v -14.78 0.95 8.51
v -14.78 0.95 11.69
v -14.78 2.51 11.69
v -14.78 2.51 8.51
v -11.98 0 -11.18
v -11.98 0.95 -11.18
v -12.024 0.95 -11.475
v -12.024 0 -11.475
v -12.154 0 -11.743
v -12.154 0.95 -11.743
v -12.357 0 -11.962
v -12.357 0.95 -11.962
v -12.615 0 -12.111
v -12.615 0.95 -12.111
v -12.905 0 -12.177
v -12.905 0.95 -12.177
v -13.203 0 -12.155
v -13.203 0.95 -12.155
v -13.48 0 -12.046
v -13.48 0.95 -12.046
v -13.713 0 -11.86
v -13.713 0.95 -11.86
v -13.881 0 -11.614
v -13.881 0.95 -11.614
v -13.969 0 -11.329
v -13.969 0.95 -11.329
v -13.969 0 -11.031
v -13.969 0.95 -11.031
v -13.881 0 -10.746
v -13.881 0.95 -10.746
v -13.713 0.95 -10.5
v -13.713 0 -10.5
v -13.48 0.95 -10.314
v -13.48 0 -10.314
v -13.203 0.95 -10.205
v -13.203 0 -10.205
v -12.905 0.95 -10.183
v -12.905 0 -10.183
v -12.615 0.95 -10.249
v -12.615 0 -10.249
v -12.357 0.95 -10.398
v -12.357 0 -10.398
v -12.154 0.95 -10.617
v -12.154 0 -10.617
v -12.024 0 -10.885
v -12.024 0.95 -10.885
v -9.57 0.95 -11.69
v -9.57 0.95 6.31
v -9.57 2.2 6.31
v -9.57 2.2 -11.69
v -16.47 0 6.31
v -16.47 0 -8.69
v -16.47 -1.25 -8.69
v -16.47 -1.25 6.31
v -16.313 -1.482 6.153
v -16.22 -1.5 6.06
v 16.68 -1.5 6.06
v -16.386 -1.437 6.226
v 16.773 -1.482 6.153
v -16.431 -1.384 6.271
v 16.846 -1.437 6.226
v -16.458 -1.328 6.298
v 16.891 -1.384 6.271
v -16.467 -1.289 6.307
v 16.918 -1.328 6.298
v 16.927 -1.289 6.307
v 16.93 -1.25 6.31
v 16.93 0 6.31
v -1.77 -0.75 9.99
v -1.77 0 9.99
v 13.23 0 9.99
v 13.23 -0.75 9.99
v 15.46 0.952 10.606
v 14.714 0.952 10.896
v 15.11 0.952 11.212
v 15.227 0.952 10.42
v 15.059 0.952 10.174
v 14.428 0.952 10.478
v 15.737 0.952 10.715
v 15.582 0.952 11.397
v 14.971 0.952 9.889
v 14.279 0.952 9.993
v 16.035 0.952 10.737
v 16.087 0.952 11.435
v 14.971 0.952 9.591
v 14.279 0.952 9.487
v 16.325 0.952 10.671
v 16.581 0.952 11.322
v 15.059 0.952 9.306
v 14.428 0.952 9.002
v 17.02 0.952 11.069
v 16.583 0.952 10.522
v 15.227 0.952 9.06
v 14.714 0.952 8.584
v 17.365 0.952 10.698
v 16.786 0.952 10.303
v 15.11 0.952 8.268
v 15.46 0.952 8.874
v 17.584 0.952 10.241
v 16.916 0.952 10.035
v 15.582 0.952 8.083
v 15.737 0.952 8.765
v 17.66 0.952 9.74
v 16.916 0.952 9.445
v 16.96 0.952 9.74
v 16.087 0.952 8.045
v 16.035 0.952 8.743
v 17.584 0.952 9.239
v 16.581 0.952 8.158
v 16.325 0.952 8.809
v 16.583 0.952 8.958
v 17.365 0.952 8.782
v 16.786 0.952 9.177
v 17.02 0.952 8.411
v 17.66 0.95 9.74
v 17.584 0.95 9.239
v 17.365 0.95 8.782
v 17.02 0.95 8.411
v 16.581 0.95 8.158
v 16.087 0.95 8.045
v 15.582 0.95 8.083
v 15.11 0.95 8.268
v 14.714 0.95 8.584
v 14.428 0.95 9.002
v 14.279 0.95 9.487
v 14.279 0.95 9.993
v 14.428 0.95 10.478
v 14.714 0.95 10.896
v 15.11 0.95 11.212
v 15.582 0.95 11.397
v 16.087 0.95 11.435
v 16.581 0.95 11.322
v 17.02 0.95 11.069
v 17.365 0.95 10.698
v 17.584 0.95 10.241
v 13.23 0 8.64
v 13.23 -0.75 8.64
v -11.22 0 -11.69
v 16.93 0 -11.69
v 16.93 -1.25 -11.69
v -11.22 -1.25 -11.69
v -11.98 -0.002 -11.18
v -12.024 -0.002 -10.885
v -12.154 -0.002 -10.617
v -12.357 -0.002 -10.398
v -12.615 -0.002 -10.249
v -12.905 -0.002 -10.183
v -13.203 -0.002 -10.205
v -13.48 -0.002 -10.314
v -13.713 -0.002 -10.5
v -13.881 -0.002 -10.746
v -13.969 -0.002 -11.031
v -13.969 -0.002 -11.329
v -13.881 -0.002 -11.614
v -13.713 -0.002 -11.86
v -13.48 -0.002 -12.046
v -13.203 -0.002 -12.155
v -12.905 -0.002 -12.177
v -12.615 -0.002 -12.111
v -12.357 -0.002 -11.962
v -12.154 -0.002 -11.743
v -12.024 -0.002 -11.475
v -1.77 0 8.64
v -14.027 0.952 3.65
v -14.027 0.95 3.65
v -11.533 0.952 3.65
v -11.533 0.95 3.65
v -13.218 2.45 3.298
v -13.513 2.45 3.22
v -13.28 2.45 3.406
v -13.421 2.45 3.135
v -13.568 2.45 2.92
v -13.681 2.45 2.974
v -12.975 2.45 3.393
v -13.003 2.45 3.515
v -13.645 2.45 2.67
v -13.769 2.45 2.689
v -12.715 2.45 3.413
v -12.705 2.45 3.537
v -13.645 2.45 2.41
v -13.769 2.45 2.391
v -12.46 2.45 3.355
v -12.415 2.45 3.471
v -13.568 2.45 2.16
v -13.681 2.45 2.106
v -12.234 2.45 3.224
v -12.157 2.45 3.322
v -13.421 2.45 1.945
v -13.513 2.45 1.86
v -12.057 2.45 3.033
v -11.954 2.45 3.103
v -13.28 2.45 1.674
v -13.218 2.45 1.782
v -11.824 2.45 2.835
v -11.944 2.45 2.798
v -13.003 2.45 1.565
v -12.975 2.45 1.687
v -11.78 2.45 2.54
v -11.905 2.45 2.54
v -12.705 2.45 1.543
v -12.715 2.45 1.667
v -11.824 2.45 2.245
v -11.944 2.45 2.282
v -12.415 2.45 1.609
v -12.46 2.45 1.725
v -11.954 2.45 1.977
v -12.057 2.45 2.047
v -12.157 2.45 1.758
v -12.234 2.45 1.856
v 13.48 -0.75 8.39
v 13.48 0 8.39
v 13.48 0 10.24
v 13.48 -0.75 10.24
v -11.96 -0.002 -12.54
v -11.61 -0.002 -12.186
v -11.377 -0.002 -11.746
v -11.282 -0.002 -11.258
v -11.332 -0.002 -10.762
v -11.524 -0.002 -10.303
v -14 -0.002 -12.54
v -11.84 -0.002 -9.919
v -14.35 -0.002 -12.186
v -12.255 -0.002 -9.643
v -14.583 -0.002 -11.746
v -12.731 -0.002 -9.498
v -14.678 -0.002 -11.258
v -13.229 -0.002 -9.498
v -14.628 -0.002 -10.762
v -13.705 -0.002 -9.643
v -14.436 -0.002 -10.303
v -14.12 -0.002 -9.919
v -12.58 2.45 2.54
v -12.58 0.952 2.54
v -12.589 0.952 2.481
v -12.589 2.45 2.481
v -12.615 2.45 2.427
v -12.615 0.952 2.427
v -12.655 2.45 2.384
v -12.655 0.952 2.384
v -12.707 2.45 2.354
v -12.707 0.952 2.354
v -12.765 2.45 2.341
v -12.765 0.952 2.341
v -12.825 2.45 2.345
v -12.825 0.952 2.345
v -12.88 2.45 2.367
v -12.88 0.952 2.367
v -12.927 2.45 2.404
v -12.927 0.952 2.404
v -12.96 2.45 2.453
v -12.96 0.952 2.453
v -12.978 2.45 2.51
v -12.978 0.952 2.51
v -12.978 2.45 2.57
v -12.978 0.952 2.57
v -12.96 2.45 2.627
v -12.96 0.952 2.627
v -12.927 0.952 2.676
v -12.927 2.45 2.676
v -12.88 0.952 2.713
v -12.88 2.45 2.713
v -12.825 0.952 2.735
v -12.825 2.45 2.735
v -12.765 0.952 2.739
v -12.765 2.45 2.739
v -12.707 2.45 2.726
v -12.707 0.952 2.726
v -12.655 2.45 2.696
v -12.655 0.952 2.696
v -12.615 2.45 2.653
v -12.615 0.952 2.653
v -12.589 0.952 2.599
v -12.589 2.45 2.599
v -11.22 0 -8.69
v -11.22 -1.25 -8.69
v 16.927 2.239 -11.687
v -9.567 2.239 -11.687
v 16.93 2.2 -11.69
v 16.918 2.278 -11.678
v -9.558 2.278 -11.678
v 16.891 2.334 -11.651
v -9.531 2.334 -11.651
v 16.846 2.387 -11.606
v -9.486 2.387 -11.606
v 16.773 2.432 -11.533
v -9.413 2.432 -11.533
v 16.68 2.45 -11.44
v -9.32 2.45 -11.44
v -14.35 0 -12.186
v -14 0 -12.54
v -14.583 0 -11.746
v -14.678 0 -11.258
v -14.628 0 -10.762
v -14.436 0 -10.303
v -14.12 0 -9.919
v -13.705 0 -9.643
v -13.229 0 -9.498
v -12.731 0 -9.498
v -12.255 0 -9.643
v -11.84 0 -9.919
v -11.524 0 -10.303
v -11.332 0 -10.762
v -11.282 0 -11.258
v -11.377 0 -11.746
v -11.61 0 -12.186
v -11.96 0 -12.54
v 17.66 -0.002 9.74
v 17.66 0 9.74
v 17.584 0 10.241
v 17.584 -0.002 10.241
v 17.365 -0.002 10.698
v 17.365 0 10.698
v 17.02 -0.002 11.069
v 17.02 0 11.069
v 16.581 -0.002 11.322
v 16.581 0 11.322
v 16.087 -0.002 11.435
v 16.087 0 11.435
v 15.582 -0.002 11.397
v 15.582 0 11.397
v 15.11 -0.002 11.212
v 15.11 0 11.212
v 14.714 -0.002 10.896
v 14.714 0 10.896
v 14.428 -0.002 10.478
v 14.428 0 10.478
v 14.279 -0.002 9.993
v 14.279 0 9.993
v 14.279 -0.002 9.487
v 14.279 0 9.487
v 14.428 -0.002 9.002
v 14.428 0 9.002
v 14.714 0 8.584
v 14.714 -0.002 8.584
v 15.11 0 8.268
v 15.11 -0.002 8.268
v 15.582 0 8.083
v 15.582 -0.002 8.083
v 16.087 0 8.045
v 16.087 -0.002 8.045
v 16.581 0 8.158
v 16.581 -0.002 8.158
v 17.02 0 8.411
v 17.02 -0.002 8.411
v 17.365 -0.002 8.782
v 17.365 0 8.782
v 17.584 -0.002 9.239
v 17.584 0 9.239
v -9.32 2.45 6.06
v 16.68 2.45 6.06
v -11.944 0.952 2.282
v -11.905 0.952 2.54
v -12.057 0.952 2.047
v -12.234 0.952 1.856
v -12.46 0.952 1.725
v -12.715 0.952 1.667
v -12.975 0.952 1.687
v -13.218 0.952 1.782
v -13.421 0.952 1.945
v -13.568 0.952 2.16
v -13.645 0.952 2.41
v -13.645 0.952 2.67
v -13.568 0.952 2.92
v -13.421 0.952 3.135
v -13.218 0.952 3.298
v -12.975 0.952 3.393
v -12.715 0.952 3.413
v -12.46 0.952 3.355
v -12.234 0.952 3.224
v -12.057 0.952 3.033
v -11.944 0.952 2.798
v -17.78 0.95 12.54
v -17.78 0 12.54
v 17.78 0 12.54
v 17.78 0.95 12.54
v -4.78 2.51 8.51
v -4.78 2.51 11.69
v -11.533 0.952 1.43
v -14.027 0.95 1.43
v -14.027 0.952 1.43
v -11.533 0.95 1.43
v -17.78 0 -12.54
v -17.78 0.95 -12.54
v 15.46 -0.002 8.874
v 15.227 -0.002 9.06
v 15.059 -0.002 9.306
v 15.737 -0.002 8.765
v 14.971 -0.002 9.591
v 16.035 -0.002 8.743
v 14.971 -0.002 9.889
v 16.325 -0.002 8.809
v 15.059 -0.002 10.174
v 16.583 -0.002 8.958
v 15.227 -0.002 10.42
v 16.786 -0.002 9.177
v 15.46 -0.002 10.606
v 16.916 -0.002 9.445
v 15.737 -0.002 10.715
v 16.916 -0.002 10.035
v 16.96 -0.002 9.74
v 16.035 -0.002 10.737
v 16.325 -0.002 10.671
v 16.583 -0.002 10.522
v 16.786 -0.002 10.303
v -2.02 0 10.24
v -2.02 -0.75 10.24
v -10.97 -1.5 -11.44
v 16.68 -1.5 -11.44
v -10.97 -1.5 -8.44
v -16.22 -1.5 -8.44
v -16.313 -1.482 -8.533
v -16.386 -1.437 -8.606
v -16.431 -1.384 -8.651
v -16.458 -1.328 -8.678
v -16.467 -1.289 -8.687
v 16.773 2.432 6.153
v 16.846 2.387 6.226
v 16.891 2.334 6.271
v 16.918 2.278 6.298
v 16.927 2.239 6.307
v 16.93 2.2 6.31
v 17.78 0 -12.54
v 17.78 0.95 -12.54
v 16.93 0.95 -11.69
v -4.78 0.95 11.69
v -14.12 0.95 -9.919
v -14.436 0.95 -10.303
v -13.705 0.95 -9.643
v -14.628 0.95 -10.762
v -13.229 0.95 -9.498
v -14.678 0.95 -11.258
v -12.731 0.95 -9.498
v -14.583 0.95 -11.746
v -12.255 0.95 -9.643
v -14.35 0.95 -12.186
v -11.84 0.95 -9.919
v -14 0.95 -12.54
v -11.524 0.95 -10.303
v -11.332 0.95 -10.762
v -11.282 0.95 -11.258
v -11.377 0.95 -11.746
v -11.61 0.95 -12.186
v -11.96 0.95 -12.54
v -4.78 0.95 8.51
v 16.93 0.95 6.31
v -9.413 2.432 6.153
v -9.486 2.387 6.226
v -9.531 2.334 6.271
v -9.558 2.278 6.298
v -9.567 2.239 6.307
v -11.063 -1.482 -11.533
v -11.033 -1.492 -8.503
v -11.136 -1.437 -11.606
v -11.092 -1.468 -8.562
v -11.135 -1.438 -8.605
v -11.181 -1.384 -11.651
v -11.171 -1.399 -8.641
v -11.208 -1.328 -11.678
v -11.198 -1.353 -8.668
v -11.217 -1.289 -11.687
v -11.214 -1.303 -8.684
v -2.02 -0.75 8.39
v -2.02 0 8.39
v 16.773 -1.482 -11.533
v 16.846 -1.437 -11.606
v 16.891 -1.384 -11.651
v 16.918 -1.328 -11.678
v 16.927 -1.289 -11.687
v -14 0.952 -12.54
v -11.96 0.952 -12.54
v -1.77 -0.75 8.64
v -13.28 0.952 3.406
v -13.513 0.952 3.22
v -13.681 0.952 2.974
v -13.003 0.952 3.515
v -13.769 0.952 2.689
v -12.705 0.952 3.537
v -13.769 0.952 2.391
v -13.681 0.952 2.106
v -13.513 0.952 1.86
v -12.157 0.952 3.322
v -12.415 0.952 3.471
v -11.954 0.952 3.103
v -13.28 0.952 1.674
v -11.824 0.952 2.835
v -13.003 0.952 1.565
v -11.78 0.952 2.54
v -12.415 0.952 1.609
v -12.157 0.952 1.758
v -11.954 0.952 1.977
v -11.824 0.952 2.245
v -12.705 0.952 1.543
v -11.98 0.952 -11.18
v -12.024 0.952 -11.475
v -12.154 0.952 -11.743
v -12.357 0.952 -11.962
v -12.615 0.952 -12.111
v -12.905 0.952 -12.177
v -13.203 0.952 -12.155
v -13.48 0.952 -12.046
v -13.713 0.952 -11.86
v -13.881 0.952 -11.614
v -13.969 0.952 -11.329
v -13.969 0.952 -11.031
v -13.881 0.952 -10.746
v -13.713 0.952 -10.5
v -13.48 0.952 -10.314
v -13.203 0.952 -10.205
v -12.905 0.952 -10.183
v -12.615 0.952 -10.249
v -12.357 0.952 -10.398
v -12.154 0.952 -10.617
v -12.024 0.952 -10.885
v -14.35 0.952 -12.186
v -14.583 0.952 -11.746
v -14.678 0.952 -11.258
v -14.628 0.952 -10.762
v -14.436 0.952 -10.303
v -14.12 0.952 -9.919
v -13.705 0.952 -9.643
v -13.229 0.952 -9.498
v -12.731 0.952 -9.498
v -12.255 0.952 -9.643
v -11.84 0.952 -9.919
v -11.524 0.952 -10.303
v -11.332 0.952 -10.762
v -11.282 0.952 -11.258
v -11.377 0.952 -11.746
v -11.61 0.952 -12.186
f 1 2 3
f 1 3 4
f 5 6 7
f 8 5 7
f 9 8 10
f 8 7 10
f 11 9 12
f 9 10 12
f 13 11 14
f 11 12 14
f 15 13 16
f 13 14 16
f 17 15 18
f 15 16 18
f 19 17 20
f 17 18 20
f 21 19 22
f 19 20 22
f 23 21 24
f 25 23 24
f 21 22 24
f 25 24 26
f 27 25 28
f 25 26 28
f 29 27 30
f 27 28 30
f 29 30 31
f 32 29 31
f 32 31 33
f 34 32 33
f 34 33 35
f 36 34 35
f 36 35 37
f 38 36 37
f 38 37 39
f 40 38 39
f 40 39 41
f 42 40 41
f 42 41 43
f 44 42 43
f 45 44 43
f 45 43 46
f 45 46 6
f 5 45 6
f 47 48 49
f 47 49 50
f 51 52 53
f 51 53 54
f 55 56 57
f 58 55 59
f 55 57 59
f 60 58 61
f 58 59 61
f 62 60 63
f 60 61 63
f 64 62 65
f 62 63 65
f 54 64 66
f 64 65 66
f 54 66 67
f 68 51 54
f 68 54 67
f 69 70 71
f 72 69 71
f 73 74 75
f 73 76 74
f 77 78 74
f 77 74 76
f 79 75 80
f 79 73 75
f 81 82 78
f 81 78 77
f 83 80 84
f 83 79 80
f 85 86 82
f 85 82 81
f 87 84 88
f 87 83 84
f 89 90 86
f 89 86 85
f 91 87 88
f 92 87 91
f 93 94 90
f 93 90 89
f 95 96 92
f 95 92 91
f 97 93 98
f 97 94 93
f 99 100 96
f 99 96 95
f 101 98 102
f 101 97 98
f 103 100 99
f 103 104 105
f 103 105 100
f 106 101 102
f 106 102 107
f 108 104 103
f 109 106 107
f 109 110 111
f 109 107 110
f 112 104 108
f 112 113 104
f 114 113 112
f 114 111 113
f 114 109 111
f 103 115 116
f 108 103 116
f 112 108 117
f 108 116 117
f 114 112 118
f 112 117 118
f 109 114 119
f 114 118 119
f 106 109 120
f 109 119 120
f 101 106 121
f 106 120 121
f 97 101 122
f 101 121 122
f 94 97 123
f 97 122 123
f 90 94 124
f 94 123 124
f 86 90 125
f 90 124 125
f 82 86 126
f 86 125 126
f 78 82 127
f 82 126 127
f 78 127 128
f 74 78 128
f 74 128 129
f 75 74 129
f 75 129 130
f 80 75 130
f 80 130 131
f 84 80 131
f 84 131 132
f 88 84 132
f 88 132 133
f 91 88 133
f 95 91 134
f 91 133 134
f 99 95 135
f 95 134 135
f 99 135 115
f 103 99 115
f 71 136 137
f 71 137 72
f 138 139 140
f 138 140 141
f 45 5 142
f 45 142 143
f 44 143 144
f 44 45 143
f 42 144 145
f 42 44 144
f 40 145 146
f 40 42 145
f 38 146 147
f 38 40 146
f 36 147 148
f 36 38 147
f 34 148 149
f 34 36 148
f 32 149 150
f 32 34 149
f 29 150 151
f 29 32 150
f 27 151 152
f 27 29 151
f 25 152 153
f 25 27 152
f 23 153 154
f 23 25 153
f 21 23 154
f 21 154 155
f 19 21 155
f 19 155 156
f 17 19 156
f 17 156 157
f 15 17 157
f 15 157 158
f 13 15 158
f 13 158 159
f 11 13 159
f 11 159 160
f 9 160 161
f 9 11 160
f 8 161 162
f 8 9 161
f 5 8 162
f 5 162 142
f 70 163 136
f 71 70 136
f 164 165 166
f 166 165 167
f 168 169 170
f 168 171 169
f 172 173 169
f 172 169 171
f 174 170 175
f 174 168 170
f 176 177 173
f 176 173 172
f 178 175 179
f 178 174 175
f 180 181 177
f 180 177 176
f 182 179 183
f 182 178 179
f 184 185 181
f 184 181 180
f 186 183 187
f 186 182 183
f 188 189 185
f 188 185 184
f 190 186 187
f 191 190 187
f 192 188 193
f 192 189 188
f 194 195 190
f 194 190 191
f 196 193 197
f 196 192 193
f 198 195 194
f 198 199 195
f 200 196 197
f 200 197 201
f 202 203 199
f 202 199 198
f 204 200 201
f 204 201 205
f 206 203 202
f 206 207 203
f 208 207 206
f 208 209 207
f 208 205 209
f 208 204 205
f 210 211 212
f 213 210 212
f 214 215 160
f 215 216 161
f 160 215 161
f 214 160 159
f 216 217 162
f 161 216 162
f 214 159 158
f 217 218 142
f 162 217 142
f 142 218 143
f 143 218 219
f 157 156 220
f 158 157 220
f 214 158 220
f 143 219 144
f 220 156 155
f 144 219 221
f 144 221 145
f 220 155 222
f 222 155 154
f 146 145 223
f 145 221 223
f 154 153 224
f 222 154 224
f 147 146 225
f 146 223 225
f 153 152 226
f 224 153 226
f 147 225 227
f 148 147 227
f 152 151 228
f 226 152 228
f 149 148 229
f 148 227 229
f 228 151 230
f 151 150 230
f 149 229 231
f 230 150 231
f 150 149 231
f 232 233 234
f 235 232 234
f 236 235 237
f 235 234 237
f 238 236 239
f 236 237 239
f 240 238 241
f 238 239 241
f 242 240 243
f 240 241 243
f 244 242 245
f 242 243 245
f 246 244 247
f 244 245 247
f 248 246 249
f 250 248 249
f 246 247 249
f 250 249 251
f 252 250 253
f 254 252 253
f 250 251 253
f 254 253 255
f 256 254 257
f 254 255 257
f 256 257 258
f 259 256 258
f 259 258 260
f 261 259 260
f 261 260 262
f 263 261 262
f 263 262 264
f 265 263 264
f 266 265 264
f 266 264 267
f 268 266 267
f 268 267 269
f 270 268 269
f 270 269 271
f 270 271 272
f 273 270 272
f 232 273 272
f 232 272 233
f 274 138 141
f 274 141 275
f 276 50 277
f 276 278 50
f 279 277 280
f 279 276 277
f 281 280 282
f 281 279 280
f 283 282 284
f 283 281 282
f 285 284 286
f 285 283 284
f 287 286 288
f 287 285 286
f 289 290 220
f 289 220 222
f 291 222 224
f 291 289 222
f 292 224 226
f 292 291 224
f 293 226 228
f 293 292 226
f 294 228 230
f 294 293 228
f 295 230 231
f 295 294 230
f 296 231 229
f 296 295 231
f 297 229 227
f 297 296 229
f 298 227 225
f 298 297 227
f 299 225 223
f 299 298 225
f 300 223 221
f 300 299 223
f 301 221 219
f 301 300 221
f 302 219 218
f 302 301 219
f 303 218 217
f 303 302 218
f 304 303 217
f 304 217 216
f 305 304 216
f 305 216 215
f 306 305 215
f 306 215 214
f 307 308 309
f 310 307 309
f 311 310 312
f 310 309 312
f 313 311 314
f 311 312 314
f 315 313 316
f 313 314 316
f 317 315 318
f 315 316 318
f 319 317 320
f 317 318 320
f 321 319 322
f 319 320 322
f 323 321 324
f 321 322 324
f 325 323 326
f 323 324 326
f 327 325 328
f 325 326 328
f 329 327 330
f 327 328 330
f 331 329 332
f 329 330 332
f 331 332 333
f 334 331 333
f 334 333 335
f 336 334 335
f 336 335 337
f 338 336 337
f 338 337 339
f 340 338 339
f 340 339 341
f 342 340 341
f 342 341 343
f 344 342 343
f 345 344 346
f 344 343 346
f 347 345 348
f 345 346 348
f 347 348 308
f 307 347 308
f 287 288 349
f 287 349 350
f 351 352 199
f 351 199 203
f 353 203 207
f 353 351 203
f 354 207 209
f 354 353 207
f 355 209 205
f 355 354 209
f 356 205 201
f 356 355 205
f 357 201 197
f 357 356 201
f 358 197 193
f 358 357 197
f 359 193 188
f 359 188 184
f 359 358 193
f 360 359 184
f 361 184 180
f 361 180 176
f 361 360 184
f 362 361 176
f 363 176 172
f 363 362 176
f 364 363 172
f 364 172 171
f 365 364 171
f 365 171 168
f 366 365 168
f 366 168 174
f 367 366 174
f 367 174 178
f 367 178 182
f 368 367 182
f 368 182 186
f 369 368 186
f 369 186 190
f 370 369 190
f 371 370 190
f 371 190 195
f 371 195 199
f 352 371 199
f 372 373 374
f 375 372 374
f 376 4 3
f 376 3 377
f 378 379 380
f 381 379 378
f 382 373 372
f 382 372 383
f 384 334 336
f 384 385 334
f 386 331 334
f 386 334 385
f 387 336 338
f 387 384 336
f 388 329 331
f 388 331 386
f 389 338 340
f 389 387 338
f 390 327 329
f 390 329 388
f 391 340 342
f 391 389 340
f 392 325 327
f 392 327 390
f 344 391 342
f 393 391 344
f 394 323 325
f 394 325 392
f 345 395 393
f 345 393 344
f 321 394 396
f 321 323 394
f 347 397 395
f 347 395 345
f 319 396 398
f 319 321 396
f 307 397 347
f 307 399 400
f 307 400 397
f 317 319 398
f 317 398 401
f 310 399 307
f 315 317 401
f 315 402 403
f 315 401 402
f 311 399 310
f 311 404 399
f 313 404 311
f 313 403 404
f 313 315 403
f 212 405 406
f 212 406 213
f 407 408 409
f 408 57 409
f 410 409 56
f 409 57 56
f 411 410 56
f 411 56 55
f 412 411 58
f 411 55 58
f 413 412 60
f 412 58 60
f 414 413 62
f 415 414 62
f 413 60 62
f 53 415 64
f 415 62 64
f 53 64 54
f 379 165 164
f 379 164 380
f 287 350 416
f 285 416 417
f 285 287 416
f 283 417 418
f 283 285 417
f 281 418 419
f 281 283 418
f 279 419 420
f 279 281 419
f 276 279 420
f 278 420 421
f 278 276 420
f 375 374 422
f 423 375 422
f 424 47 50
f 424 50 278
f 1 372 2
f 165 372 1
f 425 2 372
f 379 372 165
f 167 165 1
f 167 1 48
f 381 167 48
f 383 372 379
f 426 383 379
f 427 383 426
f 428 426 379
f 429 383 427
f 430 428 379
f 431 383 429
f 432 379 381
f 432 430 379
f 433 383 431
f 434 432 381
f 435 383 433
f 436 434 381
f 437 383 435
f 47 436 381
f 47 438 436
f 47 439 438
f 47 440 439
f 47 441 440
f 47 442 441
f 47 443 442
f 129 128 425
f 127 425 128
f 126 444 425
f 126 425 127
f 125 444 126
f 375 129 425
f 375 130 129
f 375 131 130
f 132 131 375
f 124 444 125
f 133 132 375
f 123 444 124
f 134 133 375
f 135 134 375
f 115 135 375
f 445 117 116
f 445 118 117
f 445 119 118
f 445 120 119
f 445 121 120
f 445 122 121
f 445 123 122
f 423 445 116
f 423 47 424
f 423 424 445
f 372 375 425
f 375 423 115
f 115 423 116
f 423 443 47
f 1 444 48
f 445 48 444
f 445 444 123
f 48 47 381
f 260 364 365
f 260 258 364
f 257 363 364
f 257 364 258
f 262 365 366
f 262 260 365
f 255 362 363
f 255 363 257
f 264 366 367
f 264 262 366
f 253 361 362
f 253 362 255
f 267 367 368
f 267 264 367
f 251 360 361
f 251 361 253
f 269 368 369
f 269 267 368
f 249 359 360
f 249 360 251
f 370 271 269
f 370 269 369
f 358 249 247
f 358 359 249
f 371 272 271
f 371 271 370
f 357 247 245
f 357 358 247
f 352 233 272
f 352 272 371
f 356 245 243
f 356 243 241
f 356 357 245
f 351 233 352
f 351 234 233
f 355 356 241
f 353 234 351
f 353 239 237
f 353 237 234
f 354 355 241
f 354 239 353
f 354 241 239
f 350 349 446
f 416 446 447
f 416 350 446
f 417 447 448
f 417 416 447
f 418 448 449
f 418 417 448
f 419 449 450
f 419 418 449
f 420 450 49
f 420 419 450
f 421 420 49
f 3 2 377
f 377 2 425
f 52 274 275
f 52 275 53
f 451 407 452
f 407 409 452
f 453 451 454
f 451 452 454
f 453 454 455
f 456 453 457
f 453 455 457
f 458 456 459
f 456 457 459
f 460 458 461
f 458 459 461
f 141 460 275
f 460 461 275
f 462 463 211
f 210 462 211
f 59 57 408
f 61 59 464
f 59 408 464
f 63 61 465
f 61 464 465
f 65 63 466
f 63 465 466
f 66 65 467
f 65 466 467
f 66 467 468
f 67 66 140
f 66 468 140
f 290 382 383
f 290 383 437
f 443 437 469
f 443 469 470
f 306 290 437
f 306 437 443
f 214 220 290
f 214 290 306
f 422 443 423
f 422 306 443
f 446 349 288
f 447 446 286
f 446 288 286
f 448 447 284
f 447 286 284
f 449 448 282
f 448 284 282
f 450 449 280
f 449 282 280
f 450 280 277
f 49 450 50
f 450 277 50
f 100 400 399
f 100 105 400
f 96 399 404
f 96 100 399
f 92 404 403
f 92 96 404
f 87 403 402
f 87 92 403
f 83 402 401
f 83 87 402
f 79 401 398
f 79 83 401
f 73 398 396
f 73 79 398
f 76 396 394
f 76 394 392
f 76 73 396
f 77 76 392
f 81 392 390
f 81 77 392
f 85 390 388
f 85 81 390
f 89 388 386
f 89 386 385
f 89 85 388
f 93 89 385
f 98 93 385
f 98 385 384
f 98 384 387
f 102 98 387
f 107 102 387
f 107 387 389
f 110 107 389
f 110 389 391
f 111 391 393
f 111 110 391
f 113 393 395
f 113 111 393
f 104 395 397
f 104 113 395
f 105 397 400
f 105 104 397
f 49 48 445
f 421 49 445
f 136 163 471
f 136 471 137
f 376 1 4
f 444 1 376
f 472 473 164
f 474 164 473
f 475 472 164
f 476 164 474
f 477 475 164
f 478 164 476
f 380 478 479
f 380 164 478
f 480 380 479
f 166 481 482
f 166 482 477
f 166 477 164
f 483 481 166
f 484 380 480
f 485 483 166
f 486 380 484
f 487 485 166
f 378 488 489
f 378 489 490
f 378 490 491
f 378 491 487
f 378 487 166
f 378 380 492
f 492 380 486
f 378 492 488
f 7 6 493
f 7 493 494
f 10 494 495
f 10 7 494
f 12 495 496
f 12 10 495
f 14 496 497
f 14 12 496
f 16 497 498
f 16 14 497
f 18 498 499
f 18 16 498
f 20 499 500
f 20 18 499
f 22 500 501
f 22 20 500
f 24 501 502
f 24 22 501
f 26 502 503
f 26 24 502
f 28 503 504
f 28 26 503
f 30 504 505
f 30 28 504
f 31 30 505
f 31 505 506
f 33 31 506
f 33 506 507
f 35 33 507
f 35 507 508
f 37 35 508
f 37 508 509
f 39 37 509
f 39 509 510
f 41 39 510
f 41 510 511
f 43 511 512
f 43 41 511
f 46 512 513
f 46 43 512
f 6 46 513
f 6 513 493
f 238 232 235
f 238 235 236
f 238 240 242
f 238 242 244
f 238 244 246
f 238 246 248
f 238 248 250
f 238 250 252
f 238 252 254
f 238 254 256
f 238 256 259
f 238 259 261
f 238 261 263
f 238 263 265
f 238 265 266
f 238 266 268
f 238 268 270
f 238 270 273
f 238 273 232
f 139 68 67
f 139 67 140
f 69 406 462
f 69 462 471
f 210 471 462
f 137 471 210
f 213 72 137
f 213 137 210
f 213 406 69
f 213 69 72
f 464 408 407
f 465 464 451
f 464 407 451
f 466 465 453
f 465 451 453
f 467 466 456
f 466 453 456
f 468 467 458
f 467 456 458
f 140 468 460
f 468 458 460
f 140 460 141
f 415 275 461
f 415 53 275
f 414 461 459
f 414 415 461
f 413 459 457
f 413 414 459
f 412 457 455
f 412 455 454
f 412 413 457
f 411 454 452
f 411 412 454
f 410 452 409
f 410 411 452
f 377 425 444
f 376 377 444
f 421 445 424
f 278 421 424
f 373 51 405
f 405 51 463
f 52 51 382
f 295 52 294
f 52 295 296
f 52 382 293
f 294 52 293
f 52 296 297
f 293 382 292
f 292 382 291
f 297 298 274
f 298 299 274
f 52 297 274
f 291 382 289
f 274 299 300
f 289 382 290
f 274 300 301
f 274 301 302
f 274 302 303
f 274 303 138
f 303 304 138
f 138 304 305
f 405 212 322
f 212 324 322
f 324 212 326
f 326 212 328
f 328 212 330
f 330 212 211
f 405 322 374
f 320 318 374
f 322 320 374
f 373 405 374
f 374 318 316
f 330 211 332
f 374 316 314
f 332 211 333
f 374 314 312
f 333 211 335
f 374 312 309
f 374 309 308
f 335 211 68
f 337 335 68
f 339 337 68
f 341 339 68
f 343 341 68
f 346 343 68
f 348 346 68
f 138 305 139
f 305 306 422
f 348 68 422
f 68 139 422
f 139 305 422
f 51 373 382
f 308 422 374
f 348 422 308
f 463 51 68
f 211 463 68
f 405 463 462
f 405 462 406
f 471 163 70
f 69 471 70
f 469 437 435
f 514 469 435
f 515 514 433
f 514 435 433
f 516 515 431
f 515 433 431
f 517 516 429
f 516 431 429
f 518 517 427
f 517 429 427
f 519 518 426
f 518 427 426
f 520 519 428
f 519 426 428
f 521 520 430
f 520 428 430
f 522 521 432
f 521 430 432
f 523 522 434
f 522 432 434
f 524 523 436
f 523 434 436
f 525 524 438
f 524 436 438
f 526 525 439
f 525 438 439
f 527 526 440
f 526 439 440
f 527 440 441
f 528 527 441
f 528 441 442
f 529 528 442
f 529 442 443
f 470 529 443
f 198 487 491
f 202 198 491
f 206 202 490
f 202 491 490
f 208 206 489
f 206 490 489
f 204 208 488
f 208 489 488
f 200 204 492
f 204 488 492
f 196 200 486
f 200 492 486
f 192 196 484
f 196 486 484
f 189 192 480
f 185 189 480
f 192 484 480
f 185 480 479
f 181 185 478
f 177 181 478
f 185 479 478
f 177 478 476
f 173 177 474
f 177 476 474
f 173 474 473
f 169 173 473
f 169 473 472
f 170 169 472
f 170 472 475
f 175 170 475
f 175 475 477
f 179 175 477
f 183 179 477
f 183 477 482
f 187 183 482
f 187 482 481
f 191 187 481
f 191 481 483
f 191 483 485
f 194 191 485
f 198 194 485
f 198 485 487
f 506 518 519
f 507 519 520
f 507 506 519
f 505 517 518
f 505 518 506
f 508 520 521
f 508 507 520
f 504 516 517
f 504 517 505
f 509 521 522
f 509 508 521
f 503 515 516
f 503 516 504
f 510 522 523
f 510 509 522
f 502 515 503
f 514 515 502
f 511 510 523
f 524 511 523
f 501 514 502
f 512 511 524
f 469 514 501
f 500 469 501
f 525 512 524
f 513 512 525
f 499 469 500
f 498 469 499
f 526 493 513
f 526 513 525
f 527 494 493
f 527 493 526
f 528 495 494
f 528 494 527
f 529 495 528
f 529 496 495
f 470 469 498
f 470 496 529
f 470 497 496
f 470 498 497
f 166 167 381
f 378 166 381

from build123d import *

# Parameters (mm, degrees)
SKETCH1_W           = 35.56
SKETCH1_H           = 25.08
BOSS_EXTRUDE1_DEPTH = 0.95
SKETCH2_W           = 26.5
SKETCH2_H           = 18
BOSS_EXTRUDE2_DEPTH = 1.5
BOSS_EXTRUDE3_DEPTH = 1.5
SKETCH4_W           = 10
SKETCH4_H           = 3.18
BOSS_EXTRUDE4_DEPTH = 1.56
SKETCH5_R           = 1
SKETCH5_R_2         = 0.875
SKETCH5_R_3         = 0.2
BOSS_EXTRUDE5_DEPTH = 1.5
SKETCH6_W           = 15.5
SKETCH6_H           = 1.85
SKETCH6_W_2         = 15
SKETCH6_H_2         = 1.35
BOSS_EXTRUDE6_DEPTH = 0.75
SKETCH7_R           = 1
CUT_EXTRUDE1_DEPTH  = 3.51
SKETCH8_R           = 1
CUT_EXTRUDE2_DEPTH  = 3.45
SKETCH9_R           = 1.7
SKETCH9_R_2         = 1
BOSS_EXTRUDE7_DEPTH = 0.0025
SKETCH10_R          = 1.7
SKETCH10_R_2        = 1
BOSS_EXTRUDE8_DEPTH = 0.0025
FILLET1_R           = 0.25
SKETCH11_W          = 2.494146152
SKETCH11_H          = 2.219681882
BOSS_EXTRUDE9_DEPTH = 0.0025


with BuildPart() as part:
    # Sketch1 → Boss-Extrude1 (new body)
    with BuildSketch(Plane(origin=(0, 0, 0), x_dir=(1, 0, 0), z_dir=(0, 1, 0))):
        Rectangle(SKETCH1_W, SKETCH1_H)
    extrude(amount=BOSS_EXTRUDE1_DEPTH)

    # Sketch2 → Boss-Extrude2 (add)
    with BuildSketch(Plane(origin=(0, 0.95, 0), x_dir=(1, 0, 0), z_dir=(0, 1, 0))):
        with Locations((3.68, 2.69)):
            Rectangle(SKETCH2_W, SKETCH2_H)
    extrude(amount=BOSS_EXTRUDE2_DEPTH)

    # Sketch3 → Boss-Extrude3 (add)
    with BuildSketch(Plane.XZ):
        Polygon((16.93, 6.31), (16.93, -11.69), (-11.22, -11.69), (-11.22, -8.69), (-16.47, -8.69), (-16.47, 6.31), align=None)
    extrude(amount=BOSS_EXTRUDE3_DEPTH)

    # Sketch4 → Boss-Extrude4 (add)
    with BuildSketch(Plane(origin=(0, 0.95, 0), x_dir=(1, 0, 0), z_dir=(0, 1, 0))):
        with Locations((-9.78, -10.1)):
            Rectangle(SKETCH4_W, SKETCH4_H)
    extrude(amount=BOSS_EXTRUDE4_DEPTH)

    # Sketch5 → Boss-Extrude5 (add)
    with BuildSketch(Plane(origin=(0, 0.95, 0), x_dir=(1, 0, 0), z_dir=(0, 1, 0))):
        with Locations((-12.78, -2.54)):
            Circle(SKETCH5_R)
        with Locations((-12.78, -2.54)):
            Circle(SKETCH5_R_2, mode=Mode.SUBTRACT)
        with Locations((-12.78, -2.54)):
            Circle(SKETCH5_R_3)
    extrude(amount=BOSS_EXTRUDE5_DEPTH)

    # Sketch6 → Boss-Extrude6 (add)
    with BuildSketch(Plane.XZ):
        with Locations((5.73, 9.315)):
            Rectangle(SKETCH6_W, SKETCH6_H)
        with Locations((5.73, 9.315)):
            Rectangle(SKETCH6_W_2, SKETCH6_H_2, mode=Mode.SUBTRACT)
    extrude(amount=BOSS_EXTRUDE6_DEPTH)

    # Sketch7 → Cut-Extrude1 (cut, through all)
    with BuildSketch(Plane.XZ):
        with Locations((15.96, 9.74)):
            Circle(SKETCH7_R)
    extrude(amount=-CUT_EXTRUDE1_DEPTH, mode=Mode.SUBTRACT)

    # Sketch8 → Cut-Extrude2 (cut, through all)
    with BuildSketch(Plane(origin=(0, 0.95, 0), x_dir=(1, 0, 0), z_dir=(0, 1, 0))):
        with Locations((-12.98, 11.18)):
            Circle(SKETCH8_R)
    extrude(amount=-CUT_EXTRUDE2_DEPTH, mode=Mode.SUBTRACT)

    # Sketch9 → Boss-Extrude7 (add)
    with BuildSketch(Plane(origin=(0, 0.95, 0), x_dir=(1, 0, 0), z_dir=(0, 1, 0))):
        with Locations((15.96, -9.74)):
            Circle(SKETCH9_R)
        with Locations((15.96, -9.74)):
            Circle(SKETCH9_R_2, mode=Mode.SUBTRACT)
        with BuildLine():
            Line((-11.96, 12.54), (-14, 12.54))
            ThreePointArc((-14, 12.54), (-12.98, 9.48), (-11.96, 12.54))
        make_face()
        with Locations((-12.98, 11.18)):
            Circle(SKETCH9_R_2, mode=Mode.SUBTRACT)
    extrude(amount=BOSS_EXTRUDE7_DEPTH)

    # Sketch10 → Boss-Extrude8 (add)
    with BuildSketch(Plane.XZ):
        with Locations((15.96, 9.74)):
            Circle(SKETCH10_R)
        with Locations((15.96, 9.74)):
            Circle(SKETCH10_R_2, mode=Mode.SUBTRACT)
        with BuildLine():
            Line((-11.96, -12.54), (-14, -12.54))
            ThreePointArc((-14, -12.54), (-12.98, -9.48), (-11.96, -12.54))
        make_face()
        with Locations((-12.98, -11.18)):
            Circle(SKETCH10_R_2, mode=Mode.SUBTRACT)
    extrude(amount=BOSS_EXTRUDE8_DEPTH)

    # Fillet1
    fillet1_edges = [part.edges().sort_by_distance(p)[0] for p in [
        (-9.57, 2.45, -2.69),
        (3.68, 2.45, 6.31),
        (16.93, 2.45, -2.69),
        (3.68, 2.45, -11.69),
        (2.855, -1.5, -11.69),
        (16.93, -1.5, -2.69),
        (0.23, -1.5, 6.31),
        (-16.47, -1.5, -1.19),
        (-13.845, -1.5, -8.69),
        (-11.22, -1.5, -10.19),
    ]]
    fillet(fillet1_edges, radius=FILLET1_R)

    # Sketch11 → Boss-Extrude9 (add)
    with BuildSketch(Plane(origin=(0, 0.95, 0), x_dir=(1, 0, 0), z_dir=(0, 1, 0))):
        with Locations((-12.78, -2.54)):
            Rectangle(SKETCH11_W, SKETCH11_H)
    extrude(amount=BOSS_EXTRUDE9_DEPTH)


solid = part.part
